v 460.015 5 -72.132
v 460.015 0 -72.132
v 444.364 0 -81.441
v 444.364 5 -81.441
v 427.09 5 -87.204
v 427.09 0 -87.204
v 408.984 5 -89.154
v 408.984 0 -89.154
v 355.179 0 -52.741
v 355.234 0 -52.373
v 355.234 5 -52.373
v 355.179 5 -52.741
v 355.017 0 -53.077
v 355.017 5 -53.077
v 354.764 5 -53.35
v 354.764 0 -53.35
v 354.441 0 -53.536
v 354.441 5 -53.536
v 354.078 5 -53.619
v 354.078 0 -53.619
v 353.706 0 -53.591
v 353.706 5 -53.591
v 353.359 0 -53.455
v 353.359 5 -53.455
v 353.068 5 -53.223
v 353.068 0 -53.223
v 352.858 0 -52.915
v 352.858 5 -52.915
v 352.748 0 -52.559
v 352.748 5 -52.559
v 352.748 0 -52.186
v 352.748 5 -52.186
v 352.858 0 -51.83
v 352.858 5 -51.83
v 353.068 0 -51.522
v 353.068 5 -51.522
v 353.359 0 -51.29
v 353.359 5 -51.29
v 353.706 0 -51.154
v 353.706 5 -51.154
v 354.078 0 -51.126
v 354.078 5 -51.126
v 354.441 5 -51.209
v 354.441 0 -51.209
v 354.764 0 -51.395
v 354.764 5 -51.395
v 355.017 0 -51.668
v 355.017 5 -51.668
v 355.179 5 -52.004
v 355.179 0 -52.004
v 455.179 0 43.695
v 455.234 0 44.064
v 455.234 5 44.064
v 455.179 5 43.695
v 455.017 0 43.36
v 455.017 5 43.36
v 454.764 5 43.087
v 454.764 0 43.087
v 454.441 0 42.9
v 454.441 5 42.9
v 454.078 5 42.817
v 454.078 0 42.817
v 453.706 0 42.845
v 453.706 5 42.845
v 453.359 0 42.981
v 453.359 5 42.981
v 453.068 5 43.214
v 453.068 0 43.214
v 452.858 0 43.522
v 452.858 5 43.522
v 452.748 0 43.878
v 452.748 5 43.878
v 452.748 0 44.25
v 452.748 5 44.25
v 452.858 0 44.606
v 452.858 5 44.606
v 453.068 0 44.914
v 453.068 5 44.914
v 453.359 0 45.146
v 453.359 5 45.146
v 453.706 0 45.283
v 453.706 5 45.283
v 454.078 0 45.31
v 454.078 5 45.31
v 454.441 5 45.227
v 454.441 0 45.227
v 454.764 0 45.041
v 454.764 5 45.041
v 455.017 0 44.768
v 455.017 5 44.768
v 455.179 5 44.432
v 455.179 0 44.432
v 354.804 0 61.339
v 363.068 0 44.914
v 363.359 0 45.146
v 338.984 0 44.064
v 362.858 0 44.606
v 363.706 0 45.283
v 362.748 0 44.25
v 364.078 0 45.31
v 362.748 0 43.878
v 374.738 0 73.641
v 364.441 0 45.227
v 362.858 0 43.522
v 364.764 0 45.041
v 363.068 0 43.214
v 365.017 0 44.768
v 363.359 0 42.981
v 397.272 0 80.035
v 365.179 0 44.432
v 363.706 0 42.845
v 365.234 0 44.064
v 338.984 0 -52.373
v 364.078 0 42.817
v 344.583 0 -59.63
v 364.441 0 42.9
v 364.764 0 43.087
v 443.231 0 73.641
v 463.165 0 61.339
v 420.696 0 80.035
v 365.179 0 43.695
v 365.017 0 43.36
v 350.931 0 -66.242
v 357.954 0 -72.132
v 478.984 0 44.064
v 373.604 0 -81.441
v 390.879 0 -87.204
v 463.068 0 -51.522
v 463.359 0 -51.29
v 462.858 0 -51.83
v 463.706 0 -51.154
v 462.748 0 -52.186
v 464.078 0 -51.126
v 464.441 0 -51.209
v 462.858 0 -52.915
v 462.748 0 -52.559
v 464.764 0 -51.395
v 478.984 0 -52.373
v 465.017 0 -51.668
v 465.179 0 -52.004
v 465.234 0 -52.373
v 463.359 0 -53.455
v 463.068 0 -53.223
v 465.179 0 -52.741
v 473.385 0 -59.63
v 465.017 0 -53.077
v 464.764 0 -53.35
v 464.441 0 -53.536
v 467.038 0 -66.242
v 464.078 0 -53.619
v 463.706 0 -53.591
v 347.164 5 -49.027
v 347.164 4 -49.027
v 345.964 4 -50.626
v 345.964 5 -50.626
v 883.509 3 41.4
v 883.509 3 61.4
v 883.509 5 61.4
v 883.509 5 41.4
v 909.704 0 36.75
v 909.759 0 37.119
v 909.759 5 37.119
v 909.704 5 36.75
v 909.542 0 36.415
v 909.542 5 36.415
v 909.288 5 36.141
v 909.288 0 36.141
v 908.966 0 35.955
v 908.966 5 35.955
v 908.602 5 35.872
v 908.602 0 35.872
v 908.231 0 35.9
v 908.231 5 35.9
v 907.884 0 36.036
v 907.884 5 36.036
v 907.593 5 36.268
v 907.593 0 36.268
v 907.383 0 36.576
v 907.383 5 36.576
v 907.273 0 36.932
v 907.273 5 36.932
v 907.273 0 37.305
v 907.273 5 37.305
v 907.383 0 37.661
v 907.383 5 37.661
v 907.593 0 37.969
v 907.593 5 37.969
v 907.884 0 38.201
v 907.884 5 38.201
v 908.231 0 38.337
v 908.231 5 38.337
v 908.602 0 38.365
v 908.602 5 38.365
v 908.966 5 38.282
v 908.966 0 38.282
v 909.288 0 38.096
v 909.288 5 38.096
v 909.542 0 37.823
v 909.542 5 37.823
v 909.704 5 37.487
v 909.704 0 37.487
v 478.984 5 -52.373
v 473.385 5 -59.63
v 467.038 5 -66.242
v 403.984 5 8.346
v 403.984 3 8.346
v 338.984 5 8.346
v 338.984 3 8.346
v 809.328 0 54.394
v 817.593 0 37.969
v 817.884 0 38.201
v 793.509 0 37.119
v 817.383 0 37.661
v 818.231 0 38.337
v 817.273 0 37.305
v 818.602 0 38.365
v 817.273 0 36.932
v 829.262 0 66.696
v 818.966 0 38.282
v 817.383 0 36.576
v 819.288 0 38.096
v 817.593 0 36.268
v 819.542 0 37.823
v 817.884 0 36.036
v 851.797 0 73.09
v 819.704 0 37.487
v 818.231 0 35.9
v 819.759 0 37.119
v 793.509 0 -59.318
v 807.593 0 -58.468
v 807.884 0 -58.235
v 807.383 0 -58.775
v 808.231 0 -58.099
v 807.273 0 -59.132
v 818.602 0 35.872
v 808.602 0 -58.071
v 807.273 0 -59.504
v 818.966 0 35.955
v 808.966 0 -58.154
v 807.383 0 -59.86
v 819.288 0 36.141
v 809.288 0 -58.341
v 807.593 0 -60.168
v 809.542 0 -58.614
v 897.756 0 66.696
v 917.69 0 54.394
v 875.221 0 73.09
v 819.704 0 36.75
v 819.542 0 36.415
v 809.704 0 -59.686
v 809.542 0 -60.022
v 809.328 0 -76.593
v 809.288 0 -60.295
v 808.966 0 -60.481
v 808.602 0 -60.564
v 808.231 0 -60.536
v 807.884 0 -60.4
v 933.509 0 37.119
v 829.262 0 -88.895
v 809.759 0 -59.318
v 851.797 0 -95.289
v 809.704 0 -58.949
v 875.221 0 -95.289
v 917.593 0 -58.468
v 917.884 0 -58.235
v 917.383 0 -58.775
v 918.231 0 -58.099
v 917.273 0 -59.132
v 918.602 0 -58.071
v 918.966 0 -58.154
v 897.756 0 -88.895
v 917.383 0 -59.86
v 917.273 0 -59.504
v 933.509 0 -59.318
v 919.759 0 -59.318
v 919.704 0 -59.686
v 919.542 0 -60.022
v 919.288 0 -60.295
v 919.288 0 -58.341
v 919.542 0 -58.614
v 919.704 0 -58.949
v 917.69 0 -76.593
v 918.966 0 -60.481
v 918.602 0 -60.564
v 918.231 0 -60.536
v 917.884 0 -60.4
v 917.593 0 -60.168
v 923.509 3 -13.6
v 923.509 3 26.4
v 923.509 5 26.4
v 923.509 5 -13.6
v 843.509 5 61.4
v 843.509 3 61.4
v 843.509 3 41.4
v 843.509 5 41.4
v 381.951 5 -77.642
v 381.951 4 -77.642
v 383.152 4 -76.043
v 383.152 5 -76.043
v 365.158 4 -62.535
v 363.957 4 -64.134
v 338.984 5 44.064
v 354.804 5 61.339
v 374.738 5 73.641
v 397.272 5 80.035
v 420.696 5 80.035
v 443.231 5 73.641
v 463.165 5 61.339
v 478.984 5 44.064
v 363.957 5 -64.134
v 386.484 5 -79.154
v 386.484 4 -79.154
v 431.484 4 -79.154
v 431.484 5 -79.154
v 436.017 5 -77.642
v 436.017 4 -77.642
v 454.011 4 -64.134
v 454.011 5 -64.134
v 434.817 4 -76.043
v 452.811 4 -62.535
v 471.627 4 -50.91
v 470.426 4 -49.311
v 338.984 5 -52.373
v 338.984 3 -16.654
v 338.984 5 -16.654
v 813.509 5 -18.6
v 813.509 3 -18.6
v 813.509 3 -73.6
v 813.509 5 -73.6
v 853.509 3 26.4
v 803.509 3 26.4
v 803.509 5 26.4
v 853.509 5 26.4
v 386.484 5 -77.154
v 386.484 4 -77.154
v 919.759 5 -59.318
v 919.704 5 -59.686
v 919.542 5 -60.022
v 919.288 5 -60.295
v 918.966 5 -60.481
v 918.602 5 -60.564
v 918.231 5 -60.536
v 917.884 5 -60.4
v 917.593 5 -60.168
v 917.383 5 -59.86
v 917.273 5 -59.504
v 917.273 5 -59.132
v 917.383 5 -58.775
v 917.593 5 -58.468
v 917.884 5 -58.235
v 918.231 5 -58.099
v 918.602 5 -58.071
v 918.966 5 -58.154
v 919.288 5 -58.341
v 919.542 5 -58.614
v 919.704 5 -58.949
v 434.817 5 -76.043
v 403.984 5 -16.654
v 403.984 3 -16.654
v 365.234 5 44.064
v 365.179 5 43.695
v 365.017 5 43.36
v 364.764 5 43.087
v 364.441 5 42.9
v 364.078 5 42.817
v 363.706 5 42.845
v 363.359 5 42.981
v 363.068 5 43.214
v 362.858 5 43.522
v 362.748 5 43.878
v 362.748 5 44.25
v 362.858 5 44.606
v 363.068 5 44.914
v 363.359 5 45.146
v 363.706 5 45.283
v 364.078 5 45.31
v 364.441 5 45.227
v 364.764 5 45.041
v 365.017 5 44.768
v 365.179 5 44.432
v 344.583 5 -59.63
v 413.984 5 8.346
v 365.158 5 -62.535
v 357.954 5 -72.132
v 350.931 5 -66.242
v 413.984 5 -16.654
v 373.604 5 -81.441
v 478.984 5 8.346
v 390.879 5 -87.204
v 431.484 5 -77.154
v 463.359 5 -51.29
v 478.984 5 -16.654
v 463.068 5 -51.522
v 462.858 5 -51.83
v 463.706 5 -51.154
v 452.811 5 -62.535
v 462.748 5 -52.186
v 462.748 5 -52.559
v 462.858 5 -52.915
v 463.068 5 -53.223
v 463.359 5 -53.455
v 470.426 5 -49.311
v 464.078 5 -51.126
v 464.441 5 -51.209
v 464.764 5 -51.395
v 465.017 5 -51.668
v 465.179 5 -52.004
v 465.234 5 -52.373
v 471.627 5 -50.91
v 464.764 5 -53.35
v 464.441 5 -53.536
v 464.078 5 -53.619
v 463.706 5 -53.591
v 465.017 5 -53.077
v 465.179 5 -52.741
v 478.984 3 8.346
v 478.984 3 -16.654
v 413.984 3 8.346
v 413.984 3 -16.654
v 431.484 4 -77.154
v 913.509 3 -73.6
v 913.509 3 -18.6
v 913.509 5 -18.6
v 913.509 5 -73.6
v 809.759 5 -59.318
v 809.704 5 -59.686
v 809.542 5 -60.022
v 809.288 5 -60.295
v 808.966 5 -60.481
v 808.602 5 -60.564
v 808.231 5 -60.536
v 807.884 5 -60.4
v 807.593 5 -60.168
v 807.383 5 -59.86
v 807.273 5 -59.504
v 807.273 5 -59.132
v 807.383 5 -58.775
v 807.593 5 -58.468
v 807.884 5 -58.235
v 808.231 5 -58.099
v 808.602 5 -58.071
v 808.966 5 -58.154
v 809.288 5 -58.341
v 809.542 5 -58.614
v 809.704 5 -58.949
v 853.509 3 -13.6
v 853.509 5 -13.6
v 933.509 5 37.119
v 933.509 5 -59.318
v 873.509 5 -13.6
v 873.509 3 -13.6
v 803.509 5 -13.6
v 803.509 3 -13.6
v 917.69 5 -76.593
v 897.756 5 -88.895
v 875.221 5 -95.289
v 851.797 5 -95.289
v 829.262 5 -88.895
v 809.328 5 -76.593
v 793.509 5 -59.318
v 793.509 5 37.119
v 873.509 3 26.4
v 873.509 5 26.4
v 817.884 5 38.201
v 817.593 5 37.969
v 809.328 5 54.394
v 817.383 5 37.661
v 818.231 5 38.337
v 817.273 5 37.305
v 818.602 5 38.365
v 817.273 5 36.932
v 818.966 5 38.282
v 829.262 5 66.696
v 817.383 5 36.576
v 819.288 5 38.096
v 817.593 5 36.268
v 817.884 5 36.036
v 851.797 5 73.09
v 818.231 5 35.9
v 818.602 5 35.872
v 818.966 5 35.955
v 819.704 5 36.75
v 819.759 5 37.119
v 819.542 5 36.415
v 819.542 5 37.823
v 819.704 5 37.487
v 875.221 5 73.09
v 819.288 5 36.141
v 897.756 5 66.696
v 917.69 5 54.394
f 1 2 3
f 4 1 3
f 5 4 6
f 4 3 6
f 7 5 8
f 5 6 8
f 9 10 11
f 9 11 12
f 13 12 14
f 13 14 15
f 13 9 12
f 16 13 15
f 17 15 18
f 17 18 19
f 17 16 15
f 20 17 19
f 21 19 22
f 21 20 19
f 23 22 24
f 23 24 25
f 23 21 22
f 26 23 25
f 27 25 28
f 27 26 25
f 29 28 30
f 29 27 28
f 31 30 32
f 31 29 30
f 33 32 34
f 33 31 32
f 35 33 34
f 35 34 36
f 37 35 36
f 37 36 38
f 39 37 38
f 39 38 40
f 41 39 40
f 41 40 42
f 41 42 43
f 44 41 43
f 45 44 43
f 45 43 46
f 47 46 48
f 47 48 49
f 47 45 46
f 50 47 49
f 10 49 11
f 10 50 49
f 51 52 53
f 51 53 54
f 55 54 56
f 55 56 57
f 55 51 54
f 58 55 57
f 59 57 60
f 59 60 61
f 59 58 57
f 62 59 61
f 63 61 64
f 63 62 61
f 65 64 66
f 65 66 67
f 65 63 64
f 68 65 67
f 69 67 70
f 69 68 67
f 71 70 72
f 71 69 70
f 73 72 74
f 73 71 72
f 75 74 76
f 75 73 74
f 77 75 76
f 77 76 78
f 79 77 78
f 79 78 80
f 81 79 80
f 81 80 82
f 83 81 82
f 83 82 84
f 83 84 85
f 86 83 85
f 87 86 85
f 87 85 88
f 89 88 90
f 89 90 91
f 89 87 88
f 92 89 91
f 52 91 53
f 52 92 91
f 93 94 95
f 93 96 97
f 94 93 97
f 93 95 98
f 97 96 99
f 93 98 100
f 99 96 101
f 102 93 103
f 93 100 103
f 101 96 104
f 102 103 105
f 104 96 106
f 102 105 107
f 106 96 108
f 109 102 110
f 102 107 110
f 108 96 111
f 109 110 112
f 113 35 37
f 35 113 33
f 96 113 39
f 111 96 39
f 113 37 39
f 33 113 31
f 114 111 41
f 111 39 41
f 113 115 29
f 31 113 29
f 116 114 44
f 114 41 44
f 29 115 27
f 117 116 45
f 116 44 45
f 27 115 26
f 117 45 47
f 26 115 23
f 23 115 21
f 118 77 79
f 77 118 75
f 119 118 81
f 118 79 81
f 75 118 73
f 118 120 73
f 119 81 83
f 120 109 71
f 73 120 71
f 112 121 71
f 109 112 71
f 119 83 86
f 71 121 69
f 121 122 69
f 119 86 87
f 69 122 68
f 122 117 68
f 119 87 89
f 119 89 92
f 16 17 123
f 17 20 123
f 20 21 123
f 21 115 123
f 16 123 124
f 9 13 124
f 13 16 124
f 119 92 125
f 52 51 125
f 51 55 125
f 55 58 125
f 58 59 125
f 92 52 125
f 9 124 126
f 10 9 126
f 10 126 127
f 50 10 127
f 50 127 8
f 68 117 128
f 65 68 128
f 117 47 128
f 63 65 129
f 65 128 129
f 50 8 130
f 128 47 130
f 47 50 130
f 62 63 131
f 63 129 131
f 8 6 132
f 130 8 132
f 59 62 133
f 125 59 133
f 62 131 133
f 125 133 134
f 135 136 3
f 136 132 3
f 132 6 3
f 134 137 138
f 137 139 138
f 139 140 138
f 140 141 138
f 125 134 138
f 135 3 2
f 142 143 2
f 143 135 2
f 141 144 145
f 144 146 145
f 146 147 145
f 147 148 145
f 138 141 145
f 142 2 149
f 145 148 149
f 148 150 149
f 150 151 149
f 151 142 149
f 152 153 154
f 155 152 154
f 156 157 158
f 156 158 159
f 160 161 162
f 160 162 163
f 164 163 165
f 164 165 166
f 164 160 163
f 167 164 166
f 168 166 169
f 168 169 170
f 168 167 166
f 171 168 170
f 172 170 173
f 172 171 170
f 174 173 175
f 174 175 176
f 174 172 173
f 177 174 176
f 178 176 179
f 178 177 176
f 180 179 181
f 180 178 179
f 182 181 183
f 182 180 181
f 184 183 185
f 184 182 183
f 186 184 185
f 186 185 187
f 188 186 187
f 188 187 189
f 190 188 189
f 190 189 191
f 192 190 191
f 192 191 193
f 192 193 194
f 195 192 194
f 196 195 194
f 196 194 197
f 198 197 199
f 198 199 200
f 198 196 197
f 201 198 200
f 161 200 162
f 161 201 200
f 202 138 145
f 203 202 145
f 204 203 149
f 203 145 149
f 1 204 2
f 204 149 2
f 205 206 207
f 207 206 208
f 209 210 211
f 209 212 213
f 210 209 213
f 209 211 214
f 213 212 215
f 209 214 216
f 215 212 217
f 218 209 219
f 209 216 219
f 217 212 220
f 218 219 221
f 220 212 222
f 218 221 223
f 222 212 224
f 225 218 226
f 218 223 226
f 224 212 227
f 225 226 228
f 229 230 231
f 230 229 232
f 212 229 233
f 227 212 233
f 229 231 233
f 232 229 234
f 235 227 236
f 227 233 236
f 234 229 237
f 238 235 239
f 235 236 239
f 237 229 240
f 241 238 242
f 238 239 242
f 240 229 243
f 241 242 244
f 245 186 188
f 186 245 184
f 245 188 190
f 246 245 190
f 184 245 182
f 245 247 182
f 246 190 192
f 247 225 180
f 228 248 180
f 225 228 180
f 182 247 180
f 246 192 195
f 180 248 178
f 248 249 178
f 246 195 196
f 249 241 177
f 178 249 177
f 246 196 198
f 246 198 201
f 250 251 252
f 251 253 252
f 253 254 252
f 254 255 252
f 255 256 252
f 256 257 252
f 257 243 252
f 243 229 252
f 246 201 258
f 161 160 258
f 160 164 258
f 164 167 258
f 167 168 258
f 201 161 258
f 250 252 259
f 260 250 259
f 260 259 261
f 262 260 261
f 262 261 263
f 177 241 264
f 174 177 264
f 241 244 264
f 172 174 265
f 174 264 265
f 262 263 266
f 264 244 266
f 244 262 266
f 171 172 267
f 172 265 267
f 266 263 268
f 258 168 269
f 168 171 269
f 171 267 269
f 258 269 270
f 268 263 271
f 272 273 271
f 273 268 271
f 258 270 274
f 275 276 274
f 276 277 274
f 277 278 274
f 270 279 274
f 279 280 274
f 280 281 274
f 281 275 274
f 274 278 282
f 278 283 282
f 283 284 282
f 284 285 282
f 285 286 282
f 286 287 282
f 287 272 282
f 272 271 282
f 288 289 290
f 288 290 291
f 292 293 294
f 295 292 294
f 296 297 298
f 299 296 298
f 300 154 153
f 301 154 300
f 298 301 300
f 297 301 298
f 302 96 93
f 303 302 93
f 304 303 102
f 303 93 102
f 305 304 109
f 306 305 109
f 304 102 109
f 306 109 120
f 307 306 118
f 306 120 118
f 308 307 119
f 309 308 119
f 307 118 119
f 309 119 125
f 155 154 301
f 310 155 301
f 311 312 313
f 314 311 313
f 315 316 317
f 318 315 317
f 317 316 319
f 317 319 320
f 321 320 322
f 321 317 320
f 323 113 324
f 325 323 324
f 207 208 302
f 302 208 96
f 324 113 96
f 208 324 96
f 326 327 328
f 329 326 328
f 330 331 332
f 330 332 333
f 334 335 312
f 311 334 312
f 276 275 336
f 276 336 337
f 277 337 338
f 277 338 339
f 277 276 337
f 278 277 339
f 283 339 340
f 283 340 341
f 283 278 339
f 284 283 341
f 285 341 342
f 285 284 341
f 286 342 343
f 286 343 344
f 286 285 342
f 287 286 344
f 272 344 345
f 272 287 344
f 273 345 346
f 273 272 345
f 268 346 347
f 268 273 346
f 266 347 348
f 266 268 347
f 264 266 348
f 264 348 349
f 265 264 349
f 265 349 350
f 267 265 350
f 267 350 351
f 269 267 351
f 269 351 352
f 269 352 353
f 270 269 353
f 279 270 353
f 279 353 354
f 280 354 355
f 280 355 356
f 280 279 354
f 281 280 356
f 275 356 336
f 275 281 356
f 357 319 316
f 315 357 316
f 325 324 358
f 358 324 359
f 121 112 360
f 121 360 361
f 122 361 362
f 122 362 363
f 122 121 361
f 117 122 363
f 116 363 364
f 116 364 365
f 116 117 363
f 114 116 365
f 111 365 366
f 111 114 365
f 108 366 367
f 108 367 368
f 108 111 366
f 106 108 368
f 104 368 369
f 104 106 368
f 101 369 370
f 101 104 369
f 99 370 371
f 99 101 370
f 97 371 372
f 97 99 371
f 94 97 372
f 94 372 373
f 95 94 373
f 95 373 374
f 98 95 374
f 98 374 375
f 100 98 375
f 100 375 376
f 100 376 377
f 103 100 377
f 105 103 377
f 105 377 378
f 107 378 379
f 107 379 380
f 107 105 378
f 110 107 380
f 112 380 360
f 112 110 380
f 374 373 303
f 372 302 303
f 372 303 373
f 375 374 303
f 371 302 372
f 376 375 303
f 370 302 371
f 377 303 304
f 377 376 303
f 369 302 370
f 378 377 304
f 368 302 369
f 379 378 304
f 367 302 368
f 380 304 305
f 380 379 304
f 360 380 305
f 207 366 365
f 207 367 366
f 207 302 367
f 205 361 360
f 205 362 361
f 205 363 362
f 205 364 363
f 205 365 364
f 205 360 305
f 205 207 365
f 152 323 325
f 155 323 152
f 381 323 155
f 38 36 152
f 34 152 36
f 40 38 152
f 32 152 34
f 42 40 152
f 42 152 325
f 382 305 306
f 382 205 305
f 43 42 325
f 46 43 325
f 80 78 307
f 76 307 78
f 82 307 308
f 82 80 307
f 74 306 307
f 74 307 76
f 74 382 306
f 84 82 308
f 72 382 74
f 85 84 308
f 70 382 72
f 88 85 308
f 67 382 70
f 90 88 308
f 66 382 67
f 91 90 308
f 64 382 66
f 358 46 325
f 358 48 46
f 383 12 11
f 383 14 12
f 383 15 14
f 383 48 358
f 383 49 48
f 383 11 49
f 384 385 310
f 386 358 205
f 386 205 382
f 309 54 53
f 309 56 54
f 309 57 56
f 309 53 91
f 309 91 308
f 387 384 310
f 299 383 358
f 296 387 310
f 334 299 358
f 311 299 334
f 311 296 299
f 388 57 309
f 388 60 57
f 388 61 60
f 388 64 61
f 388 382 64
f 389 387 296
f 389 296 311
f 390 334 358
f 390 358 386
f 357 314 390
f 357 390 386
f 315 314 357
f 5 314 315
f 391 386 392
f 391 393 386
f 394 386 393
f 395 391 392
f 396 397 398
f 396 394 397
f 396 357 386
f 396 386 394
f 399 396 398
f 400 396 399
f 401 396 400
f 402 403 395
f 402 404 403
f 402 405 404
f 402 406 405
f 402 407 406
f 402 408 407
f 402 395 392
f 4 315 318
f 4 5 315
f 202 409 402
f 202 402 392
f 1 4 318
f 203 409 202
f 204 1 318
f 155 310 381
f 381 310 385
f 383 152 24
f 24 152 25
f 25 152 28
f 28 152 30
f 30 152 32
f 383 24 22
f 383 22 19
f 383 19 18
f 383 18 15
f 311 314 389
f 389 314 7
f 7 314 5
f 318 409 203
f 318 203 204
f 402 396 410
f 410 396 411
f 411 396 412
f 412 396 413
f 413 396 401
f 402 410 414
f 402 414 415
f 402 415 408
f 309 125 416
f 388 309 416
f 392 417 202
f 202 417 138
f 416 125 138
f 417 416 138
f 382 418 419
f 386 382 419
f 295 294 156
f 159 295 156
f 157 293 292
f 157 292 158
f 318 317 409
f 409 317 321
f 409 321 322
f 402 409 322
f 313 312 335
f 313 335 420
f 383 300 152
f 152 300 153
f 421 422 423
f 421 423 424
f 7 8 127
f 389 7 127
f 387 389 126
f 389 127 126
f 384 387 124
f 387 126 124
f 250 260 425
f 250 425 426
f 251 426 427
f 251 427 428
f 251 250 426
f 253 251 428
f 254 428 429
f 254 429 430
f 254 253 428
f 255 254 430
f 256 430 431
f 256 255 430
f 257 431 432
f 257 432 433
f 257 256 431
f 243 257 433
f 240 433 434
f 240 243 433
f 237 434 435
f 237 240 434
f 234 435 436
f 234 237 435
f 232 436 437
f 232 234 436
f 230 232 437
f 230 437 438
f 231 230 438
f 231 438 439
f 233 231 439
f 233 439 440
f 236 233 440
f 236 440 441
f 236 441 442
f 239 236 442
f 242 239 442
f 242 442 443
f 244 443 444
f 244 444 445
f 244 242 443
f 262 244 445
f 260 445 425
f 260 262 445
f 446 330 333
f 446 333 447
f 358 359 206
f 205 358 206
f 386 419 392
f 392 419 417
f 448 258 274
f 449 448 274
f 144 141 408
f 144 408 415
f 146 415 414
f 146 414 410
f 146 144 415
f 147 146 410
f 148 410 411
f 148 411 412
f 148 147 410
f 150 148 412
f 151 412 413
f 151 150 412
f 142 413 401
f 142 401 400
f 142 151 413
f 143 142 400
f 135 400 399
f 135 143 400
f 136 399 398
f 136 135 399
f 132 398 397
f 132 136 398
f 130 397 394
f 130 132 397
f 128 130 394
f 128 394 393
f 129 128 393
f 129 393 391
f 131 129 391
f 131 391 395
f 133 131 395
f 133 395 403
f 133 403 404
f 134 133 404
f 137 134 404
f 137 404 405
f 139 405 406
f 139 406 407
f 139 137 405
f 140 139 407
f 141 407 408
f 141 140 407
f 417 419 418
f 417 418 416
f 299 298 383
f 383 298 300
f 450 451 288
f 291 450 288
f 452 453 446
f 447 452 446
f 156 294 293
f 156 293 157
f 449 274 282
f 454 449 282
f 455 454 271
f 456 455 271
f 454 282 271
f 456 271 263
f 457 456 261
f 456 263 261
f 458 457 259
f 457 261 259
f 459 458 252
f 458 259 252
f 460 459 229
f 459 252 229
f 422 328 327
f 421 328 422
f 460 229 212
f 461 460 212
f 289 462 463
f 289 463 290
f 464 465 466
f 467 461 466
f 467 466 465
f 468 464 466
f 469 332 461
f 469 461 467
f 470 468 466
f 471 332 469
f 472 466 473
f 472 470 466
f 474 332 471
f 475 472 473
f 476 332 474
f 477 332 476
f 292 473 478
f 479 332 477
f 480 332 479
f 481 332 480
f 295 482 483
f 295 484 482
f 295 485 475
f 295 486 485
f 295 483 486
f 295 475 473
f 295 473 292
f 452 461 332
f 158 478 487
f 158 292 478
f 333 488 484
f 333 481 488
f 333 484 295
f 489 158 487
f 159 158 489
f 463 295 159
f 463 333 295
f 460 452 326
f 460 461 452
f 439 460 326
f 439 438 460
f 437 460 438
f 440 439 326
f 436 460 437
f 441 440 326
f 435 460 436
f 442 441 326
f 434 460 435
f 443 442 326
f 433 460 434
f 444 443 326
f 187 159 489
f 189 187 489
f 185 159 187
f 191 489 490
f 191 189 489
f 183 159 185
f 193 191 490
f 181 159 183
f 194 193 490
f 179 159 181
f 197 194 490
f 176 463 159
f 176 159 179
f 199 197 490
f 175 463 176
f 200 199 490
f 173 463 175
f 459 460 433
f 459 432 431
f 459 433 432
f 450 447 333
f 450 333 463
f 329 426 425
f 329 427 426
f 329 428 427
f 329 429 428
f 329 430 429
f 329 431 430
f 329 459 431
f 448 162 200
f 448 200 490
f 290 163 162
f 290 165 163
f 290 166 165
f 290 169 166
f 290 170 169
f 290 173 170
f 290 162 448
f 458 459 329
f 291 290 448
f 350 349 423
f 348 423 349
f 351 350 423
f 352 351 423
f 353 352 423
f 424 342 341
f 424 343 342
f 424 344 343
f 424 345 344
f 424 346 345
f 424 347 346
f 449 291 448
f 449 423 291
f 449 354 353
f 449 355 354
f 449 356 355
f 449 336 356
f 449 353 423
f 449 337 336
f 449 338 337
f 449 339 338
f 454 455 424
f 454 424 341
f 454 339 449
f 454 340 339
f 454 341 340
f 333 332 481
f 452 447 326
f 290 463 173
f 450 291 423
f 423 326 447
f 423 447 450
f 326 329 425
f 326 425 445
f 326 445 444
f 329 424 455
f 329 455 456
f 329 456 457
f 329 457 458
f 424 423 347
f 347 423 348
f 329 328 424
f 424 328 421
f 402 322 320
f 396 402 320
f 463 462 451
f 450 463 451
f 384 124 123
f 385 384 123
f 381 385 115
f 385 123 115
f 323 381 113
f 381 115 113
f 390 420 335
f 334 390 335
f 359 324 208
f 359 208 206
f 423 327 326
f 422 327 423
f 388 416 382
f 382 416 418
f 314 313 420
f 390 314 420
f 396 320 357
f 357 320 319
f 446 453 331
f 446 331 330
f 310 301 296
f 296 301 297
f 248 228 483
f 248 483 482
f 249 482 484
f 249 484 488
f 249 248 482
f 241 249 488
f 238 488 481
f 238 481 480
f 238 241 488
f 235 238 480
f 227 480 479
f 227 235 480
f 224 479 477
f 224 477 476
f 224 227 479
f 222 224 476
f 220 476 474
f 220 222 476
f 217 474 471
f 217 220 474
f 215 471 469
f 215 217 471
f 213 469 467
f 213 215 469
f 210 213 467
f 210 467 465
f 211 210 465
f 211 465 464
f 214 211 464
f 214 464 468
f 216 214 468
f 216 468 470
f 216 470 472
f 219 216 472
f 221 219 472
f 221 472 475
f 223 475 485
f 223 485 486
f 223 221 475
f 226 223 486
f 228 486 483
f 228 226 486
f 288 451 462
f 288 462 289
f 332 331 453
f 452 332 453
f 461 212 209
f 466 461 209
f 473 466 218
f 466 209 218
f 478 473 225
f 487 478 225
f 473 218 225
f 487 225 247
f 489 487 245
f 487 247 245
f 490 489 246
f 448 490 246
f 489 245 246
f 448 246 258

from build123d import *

# Parameters (mm, degrees)
BOSS_EXTRUDE4_DEPTH    = 4
SKETCH2_W              = 45
SKETCH2_H              = 2
BOSS_EXTRUDE4_2_DEPTH  = 4
BOSS_EXTRUDE4_3_DEPTH  = 4
SKETCH2_8_W            = 65
SKETCH2_8_H            = 25
BOSS_EXTRUDE5_DEPTH    = 3
BOSS_EXTRUDE5_2_DEPTH  = 3
SKETCH2_9_R            = 1.25
BOSS_EXTRUDE6_DEPTH    = 5
SKETCH2_14_W           = 100
SKETCH2_14_H           = 55
BOSS_EXTRUDE10_DEPTH   = 3
SKETCH2_14_W_2         = 50
SKETCH2_14_H_2         = 40
BOSS_EXTRUDE10_2_DEPTH = 3
BOSS_EXTRUDE10_3_DEPTH = 3
SKETCH2_14_W_3         = 40
SKETCH2_14_H_3         = 20
BOSS_EXTRUDE10_4_DEPTH = 3
SKETCH2_15_W           = 40
SKETCH2_15_H           = 20
SKETCH2_15_R           = 1.25
SKETCH2_15_W_2         = 50
SKETCH2_15_H_2         = 40
SKETCH2_15_W_3         = 100
SKETCH2_15_H_3         = 55
BOSS_EXTRUDE11_DEPTH   = 5


with BuildPart() as part:
    # Sketch2 → Boss-Extrude4 (new body)
    with BuildSketch(Plane(origin=(0, 0, 0), x_dir=(1, 0, 0), z_dir=(0, 1, 0))):
        Polygon((347.164253905, 49.026683577), (383.152150384, 76.042814073), (381.951433473, 77.642276139), (345.963536994, 50.626145642), align=None)
    extrude(amount=BOSS_EXTRUDE4_DEPTH)



with BuildPart() as body_2:
    # Sketch2 → Boss-Extrude4 2 (new body)
    with BuildSketch(Plane(origin=(0, 0, 0), x_dir=(1, 0, 0), z_dir=(0, 1, 0))):
        with Locations((408.984369394, 78.154383425)):
            Rectangle(SKETCH2_W, SKETCH2_H)
    extrude(amount=BOSS_EXTRUDE4_2_DEPTH)


with BuildPart() as body_3:
    # Sketch2 → Boss-Extrude4 3 (new body)
    with BuildSketch(Plane(origin=(0, 0, 0), x_dir=(1, 0, 0), z_dir=(0, 1, 0))):
        Polygon((471.626604108, 50.9103591), (436.017305315, 77.642276139), (434.816588404, 76.042814073), (470.425887197, 49.310897034), align=None)
    extrude(amount=BOSS_EXTRUDE4_3_DEPTH)


with BuildPart() as body_4:
    # Sketch2<8> → Boss-Extrude5 (new body)
    with BuildSketch(Plane(origin=(0, 0, 0), x_dir=(1, 0, 0), z_dir=(0, 1, 0))):
        with Locations((371.484369394, 4.154383425)):
            Rectangle(SKETCH2_8_W, SKETCH2_8_H)
    extrude(amount=BOSS_EXTRUDE5_DEPTH)


with BuildPart() as body_5:
    # Sketch2<8> → Boss-Extrude5 2 (new body)
    with BuildSketch(Plane(origin=(0, 0, 0), x_dir=(1, 0, 0), z_dir=(0, 1, 0))):
        with Locations((446.484369394, 4.154383425)):
            Rectangle(SKETCH2_8_W, SKETCH2_8_H)
    extrude(amount=BOSS_EXTRUDE5_2_DEPTH)


with BuildPart() as part_1:
    add(part.part)

    add(body_2.part)  # Boss-Extrude6 merges body 2

    add(body_3.part)  # Boss-Extrude6 merges body 3

    add(body_4.part)  # Boss-Extrude6 merges body 4

    add(body_5.part)  # Boss-Extrude6 merges body 5
    # Sketch2<9> → Boss-Extrude6 (add)
    with BuildSketch(Plane(origin=(0, 0, 0), x_dir=(1, 0, 0), z_dir=(0, 1, 0))):
        with BuildLine():
            ThreePointArc((408.984369394, 89.154383425), (382.086941195, 84.786438814), (357.953900679, 72.131521219))
            ThreePointArc((357.953900679, 72.131521219), (347.668001567, 63.021208008), (338.984369394, 52.37263723))
            Line((338.984369394, 52.37263723), (338.984369394, 16.654383425))
            Line((338.984369394, 16.654383425), (403.984369394, 16.654383425))
            Line((403.984369394, 16.654383425), (403.984369394, -8.345616575))
            Line((403.984369394, -8.345616575), (338.984369394, -8.345616575))
            Line((338.984369394, -8.345616575), (338.984369394, -44.06387038))
            ThreePointArc((338.984369394, -44.06387038), (408.984369394, -80.845616575), (478.984369394, -44.06387038))
            Line((478.984369394, -44.06387038), (478.984369394, -8.345616575))
            Line((478.984369394, -8.345616575), (413.984369394, -8.345616575))
            Line((413.984369394, -8.345616575), (413.984369394, 16.654383425))
            Line((413.984369394, 16.654383425), (478.984369394, 16.654383425))
            Line((478.984369394, 16.654383425), (478.984369394, 52.37263723))
            ThreePointArc((478.984369394, 52.37263723), (470.300737221, 63.021208008), (460.01483811, 72.131521219))
            ThreePointArc((460.01483811, 72.131521219), (435.881797594, 84.786438814), (408.984369394, 89.154383425))
        make_face()
        with Locations((363.984369394, -44.06387038)):
            Circle(SKETCH2_9_R, mode=Mode.SUBTRACT)
        with Locations((453.984369394, -44.06387038)):
            Circle(SKETCH2_9_R, mode=Mode.SUBTRACT)
        with Locations((353.984369394, 52.37263723)):
            Circle(SKETCH2_9_R, mode=Mode.SUBTRACT)
        Polygon((345.963536994, 50.626145642), (363.957485234, 64.134210891), (381.951433473, 77.642276139), (383.152150384, 76.042814073), (365.158202144, 62.534748825), (347.164253905, 49.026683577), align=None, mode=Mode.SUBTRACT)
        Polygon((386.484369394, 79.154383425), (408.984369394, 79.154383425), (431.484369394, 79.154383425), (431.484369394, 77.154383425), (408.984369394, 77.154383425), (386.484369394, 77.154383425), align=None, mode=Mode.SUBTRACT)
        with Locations((463.984369394, 52.37263723)):
            Circle(SKETCH2_9_R, mode=Mode.SUBTRACT)
        Polygon((436.017305315, 77.642276139), (454.011253555, 64.134210891), (471.626604108, 50.9103591), (470.425887197, 49.310897034), (452.810536644, 62.534748825), (434.816588404, 76.042814073), align=None, mode=Mode.SUBTRACT)
    extrude(amount=BOSS_EXTRUDE6_DEPTH)


with BuildPart() as body_2_2:
    # Sketch2<14> → Boss-Extrude10 (new body)
    with BuildSketch(Plane(origin=(0, 0, 0), x_dir=(1, 0, 0), z_dir=(0, 1, 0))):
        with Locations((863.509082659, 46.099585356)):
            Rectangle(SKETCH2_14_W, SKETCH2_14_H)
    extrude(amount=BOSS_EXTRUDE10_DEPTH)



with BuildPart() as body_3_2:
    # Sketch2<14> → Boss-Extrude10 2 (new body)
    with BuildSketch(Plane(origin=(0, 0, 0), x_dir=(1, 0, 0), z_dir=(0, 1, 0))):
        with Locations((898.509082659, -6.400414644)):
            Rectangle(SKETCH2_14_W_2, SKETCH2_14_H_2)
    extrude(amount=BOSS_EXTRUDE10_2_DEPTH)


with BuildPart() as body_4_2:
    # Sketch2<14> → Boss-Extrude10 3 (new body)
    with BuildSketch(Plane(origin=(0, 0, 0), x_dir=(1, 0, 0), z_dir=(0, 1, 0))):
        with Locations((828.509082659, -6.400414644)):
            Rectangle(SKETCH2_14_W_2, SKETCH2_14_H_2)
    extrude(amount=BOSS_EXTRUDE10_3_DEPTH)


with BuildPart() as body_5_2:
    # Sketch2<14> → Boss-Extrude10 4 (new body)
    with BuildSketch(Plane(origin=(0, 0, 0), x_dir=(1, 0, 0), z_dir=(0, 1, 0))):
        with Locations((863.509082659, -51.400414644)):
            Rectangle(SKETCH2_14_W_3, SKETCH2_14_H_3)
    extrude(amount=BOSS_EXTRUDE10_4_DEPTH)


with BuildPart() as body_2_2_1:
    add(body_2_2.part)

    add(body_3_2.part)  # Boss-Extrude11 merges body 3 2

    add(body_4_2.part)  # Boss-Extrude11 merges body 4 2

    add(body_5_2.part)  # Boss-Extrude11 merges body 5 2
    # Sketch2<15> → Boss-Extrude11 (add)
    with BuildSketch(Plane(origin=(0, 0, 0), x_dir=(1, 0, 0), z_dir=(0, 1, 0))):
        with BuildLine():
            ThreePointArc((793.509082659, -37.118668449), (863.509082659, -73.900414644), (933.509082659, -37.118668449))
            Line((933.509082659, -37.118668449), (933.509082659, 59.31783916))
            ThreePointArc((933.509082659, 59.31783916), (863.509082659, 96.099585356), (793.509082659, 59.31783916))
            Line((793.509082659, 59.31783916), (793.509082659, -37.118668449))
        make_face()
        with Locations((863.509082659, -51.400414644)):
            Rectangle(SKETCH2_15_W, SKETCH2_15_H, mode=Mode.SUBTRACT)
        with Locations((818.509082659, -37.118668449)):
            Circle(SKETCH2_15_R, mode=Mode.SUBTRACT)
        with Locations((908.509082659, -37.118668449)):
            Circle(SKETCH2_15_R, mode=Mode.SUBTRACT)
        with Locations((828.509082659, -6.400414644)):
            Rectangle(SKETCH2_15_W_2, SKETCH2_15_H_2, mode=Mode.SUBTRACT)
        with Locations((898.509082659, -6.400414644)):
            Rectangle(SKETCH2_15_W_2, SKETCH2_15_H_2, mode=Mode.SUBTRACT)
        with Locations((863.509082659, 46.099585356)):
            Rectangle(SKETCH2_15_W_3, SKETCH2_15_H_3, mode=Mode.SUBTRACT)
        with Locations((808.509082659, 59.31783916)):
            Circle(SKETCH2_15_R, mode=Mode.SUBTRACT)
        with Locations((918.509082659, 59.31783916)):
            Circle(SKETCH2_15_R, mode=Mode.SUBTRACT)
    extrude(amount=BOSS_EXTRUDE11_DEPTH)


solid = Compound([part_1.part, body_2_2_1.part])
